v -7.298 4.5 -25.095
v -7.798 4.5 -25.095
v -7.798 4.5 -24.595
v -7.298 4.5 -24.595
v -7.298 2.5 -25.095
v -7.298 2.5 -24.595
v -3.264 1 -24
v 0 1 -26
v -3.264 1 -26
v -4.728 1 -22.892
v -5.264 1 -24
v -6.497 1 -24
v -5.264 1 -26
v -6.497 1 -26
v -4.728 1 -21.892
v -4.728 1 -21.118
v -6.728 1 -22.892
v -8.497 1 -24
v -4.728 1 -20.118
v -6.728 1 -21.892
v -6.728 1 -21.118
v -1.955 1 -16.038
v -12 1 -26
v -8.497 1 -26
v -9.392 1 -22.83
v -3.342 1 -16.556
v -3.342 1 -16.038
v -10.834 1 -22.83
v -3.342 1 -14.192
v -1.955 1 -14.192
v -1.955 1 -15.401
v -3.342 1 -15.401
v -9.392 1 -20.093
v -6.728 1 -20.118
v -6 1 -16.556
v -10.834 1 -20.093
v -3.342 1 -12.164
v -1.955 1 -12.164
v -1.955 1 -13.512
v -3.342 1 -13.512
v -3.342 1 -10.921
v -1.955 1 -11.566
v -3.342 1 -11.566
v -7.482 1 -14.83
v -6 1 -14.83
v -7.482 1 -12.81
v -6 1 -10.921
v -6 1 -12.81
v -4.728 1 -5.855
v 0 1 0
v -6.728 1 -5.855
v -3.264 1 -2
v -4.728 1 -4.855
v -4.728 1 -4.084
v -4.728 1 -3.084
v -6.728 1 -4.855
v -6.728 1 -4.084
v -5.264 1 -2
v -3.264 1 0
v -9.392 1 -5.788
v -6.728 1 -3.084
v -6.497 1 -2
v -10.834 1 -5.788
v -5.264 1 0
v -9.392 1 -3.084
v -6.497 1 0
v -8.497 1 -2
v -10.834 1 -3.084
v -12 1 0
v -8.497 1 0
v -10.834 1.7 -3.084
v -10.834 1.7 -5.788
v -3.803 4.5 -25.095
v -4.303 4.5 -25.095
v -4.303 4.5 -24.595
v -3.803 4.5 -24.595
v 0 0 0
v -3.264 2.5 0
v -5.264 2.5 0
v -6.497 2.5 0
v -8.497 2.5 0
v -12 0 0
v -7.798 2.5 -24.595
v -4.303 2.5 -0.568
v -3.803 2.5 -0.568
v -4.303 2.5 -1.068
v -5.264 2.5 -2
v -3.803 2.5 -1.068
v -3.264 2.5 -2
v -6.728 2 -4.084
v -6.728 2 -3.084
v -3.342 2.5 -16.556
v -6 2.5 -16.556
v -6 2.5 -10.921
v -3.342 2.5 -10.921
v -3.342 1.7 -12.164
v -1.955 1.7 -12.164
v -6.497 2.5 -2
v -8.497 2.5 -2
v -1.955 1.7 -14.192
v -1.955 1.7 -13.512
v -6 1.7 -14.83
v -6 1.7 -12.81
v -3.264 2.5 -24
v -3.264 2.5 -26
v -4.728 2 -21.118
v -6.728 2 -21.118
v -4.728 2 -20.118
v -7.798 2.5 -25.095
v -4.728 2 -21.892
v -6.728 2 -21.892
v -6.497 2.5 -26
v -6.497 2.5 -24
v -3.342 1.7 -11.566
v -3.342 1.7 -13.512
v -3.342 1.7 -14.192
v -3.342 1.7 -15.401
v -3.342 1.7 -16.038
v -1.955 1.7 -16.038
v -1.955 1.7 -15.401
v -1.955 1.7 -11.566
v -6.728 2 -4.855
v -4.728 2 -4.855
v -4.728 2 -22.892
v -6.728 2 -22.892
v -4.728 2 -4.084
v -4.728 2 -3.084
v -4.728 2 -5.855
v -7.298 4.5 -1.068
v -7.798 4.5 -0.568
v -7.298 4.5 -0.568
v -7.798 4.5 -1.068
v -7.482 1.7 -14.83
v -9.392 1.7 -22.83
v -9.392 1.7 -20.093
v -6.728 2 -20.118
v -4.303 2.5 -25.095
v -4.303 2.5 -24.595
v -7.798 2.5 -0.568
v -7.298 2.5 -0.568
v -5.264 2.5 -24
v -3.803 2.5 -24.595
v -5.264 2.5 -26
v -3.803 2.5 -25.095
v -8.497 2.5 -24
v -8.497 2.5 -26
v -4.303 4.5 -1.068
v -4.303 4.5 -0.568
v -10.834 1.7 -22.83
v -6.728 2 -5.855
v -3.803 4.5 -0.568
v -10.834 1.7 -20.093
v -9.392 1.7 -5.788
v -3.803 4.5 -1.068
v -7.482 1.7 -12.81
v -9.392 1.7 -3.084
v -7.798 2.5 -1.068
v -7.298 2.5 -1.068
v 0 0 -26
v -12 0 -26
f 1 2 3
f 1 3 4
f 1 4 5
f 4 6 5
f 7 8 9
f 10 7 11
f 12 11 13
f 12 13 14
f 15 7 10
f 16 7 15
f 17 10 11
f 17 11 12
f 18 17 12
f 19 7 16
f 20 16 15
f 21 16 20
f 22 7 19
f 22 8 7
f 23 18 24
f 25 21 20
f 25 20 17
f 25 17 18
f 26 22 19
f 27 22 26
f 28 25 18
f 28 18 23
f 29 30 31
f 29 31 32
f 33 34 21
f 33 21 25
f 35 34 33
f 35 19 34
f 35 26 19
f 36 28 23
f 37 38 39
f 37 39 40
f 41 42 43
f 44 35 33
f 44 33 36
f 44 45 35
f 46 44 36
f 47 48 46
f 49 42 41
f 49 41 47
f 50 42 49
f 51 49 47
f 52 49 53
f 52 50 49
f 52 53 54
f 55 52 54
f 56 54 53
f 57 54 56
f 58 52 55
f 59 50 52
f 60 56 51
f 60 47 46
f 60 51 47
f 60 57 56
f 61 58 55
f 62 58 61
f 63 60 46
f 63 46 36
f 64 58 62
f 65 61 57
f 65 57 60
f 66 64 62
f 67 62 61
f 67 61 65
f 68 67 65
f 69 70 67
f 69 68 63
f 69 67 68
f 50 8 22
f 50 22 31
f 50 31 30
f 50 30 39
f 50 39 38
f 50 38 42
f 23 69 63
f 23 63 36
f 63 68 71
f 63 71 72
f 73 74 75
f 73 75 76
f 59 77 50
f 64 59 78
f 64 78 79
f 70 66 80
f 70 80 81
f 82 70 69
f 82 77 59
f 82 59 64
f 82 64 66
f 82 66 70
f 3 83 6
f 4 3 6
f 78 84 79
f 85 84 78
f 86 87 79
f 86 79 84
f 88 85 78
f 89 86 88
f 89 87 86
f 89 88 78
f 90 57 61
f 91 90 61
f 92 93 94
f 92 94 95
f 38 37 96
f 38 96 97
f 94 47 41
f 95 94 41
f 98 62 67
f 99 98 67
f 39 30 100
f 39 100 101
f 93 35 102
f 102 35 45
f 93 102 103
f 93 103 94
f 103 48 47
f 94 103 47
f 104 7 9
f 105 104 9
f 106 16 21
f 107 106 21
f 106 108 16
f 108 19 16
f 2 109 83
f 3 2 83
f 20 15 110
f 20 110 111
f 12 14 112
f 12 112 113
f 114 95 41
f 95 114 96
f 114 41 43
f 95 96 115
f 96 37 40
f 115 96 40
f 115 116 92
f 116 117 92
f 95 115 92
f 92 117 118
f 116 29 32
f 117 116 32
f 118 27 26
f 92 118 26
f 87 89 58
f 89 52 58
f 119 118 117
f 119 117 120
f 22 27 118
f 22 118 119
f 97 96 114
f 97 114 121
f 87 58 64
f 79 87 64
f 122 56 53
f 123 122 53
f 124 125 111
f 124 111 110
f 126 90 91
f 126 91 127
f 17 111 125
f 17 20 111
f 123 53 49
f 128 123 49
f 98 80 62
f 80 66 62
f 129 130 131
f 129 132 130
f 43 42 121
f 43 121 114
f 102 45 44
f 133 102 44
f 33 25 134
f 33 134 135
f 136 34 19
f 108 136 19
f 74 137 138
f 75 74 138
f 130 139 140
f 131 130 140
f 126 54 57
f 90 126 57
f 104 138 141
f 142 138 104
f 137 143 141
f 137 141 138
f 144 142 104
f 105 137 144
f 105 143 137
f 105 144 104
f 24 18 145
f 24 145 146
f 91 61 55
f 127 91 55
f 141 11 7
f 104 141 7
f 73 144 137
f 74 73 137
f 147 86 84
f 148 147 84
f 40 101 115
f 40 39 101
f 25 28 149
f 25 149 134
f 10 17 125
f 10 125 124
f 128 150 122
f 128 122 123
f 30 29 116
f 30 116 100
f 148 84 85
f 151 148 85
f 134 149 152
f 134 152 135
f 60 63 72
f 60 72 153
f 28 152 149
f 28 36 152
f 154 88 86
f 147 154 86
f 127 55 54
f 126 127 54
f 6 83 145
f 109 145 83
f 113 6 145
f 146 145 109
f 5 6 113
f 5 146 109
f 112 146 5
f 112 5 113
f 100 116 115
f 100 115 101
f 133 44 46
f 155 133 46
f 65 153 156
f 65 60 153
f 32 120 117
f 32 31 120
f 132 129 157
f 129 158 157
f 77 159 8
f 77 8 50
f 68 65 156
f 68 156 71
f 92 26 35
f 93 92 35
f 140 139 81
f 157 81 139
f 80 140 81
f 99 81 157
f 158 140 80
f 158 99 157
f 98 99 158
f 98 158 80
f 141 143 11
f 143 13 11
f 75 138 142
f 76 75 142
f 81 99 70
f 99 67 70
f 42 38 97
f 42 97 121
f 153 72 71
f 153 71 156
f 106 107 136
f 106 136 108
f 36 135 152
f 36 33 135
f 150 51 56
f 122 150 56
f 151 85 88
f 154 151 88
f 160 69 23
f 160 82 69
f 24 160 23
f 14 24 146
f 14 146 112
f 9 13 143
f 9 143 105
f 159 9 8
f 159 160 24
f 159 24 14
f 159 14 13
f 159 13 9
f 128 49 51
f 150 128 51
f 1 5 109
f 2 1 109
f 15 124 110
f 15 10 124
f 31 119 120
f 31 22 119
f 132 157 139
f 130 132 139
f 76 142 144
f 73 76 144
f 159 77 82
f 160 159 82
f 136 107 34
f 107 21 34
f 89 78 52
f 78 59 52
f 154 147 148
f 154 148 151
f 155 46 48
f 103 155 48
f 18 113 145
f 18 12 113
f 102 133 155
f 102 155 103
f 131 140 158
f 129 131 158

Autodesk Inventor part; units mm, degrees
ref_plane "YZ Plane" through (0, 0, 0) normal (1, 0, 0) x (0, 1, 0)
ref_plane "XZ Plane" through (0, 0, 0) normal (0, 1, 0) x (-1, 0, 0)
ref_plane "XY Plane" through (0, 0, 0) normal (0, 0, 1) x (1, 0, 0)
sketch "Sketch1" plane through (0, 0, 0) normal (0, 1, 0) x (-1, 0, 0)
  line L0 (0, 0) -> (12, 0)
  line L1 (12, 0) -> (12, -26)
  line L2 (12, -26) -> (0, -26)
  line L3 (0, -26) -> (0, 0)
  dimension "d0" = 12
  dimension "d1" = 26
extrude "Extrusion1" add sketch "Sketch1" along normal blind 1
sketch "Sketch2" plane through (0, 1, 0) normal (0, 1, 0) x (1, 0, 0)
  line L0 (-8.4967, 0) -> (-6.4967, 0)
  line L1 (-6.4967, 0) -> (-6.4967, 2)
  line L2 (-6.4967, 2) -> (-8.4967, 2)
  line L3 (-8.4967, 2) -> (-8.4967, 0)
  line L4 (-5.264, 0) -> (-3.264, 0)
  line L5 (-3.264, 0) -> (-3.264, 2)
  line L6 (-3.264, 2) -> (-5.264, 2)
  line L7 (-5.264, 2) -> (-5.264, 0)
  line L8 (0, 26) -> (-12, 26) projected
  line L9 (-8.4967, 26) -> (-6.4967, 26)
  line L10 (-6.4967, 26) -> (-6.4967, 24)
  line L11 (-6.4967, 24) -> (-8.4967, 24)
  line L12 (-8.4967, 24) -> (-8.4967, 26)
  line L13 (-5.264, 24) -> (-3.264, 24)
  line L14 (-3.264, 24) -> (-3.264, 26)
  line L15 (-3.264, 26) -> (-5.264, 26)
  line L16 (-5.264, 26) -> (-5.264, 24)
  line L17 (-6, 10.9212) -> (-3.3419, 10.9212)
  line L18 (-3.3419, 10.9212) -> (-3.3419, 16.5565)
  line L19 (-3.3419, 16.5565) -> (-6, 16.5565)
  line L20 (-6, 16.5565) -> (-6, 10.9212)
  point P0 (0, 0)
  dimension "d4" = 2
  dimension "d5" = 2
  dimension "d6" = 2
  dimension "d7" = 2
  dimension "d8" = 2
extrude "Extrusion2" add sketch "Sketch2" along normal blind 1.5
sketch "Sketch3" plane through (0, 2.5, 0) normal (0, 1, 0) x (1, 0, 0)
  line L0 (-7.7977, 0.5679) -> (-7.2977, 0.5679)
  line L1 (-7.2977, 0.5679) -> (-7.2977, 1.0679)
  line L2 (-7.2977, 1.0679) -> (-7.7977, 1.0679)
  line L3 (-7.7977, 1.0679) -> (-7.7977, 0.5679)
  line L4 (-4.303, 0.5679) -> (-3.803, 0.5679)
  line L5 (-3.803, 0.5679) -> (-3.803, 1.0679)
  line L6 (-3.803, 1.0679) -> (-4.303, 1.0679)
  line L7 (-4.303, 1.0679) -> (-4.303, 0.5679)
  line L8 (-7.7977, 24.5946) -> (-7.2977, 24.5946)
  line L9 (-7.2977, 24.5946) -> (-7.2977, 25.0946)
  line L10 (-7.2977, 25.0946) -> (-7.7977, 25.0946)
  line L11 (-7.7977, 25.0946) -> (-7.7977, 24.5946)
  line L12 (-4.303, 24.5946) -> (-3.803, 24.5946)
  line L13 (-3.803, 24.5946) -> (-3.803, 25.0946)
  line L14 (-3.803, 25.0946) -> (-4.303, 25.0946)
  line L15 (-4.303, 25.0946) -> (-4.303, 24.5946)
  point P0 (0, 0)
  dimension "d11" = 0.5
  dimension "d12" = 0.5
  dimension "d13" = 0.5
  dimension "d14" = 0.5
  dimension "d15" = 0.5
  dimension "d16" = 0.5
extrude "Extrusion3" add sketch "Sketch3" along normal blind 2
sketch "Sketch4" plane through (0, 1, 0) normal (0, 1, 0) x (1, 0, 0)
  line L0 (-6.7275, 22.8918) -> (-4.7275, 22.8918)
  line L1 (-4.7275, 22.8918) -> (-4.7275, 21.8918)
  line L2 (-4.7275, 21.8918) -> (-6.7275, 21.8918)
  line L3 (-6.7275, 21.8918) -> (-6.7275, 22.8918)
  line L4 (-6.7275, 20.1179) -> (-4.7275, 20.1179)
  line L5 (-4.7275, 20.1179) -> (-4.7275, 21.1179)
  line L6 (-4.7275, 21.1179) -> (-6.7275, 21.1179)
  line L7 (-6.7275, 21.1179) -> (-6.7275, 20.1179)
  line L8 (-4.7275, 4.0841) -> (-6.7275, 4.0841)
  line L9 (-6.7275, 4.0841) -> (-6.7275, 3.0841)
  line L10 (-6.7275, 3.0841) -> (-4.7275, 3.0841)
  line L11 (-4.7275, 3.0841) -> (-4.7275, 4.0841)
  line L12 (-6.7275, 4.8554) -> (-4.7275, 4.8554)
  line L13 (-4.7275, 4.8554) -> (-4.7275, 5.8554)
  line L14 (-4.7275, 5.8554) -> (-6.7275, 5.8554)
  line L15 (-6.7275, 5.8554) -> (-6.7275, 4.8554)
  point P0 (0, 0)
  dimension "d19" = 2
  dimension "d20" = 1
  dimension "d21" = 2
  dimension "d22" = 1
  dimension "d23" = 2
  dimension "d24" = 1
  dimension "d25" = 2
  dimension "d26" = 1
extrude "Extrusion4" add sketch "Sketch4" along normal blind 1
sketch "Sketch5" plane through (0, 1, 0) normal (0, 1, 0) x (1, 0, 0)
  line L0 (-10.8338, 5.7882) -> (-9.3922, 5.7882)
  line L1 (-9.3922, 5.7882) -> (-9.3922, 3.0841)
  line L2 (-9.3922, 3.0841) -> (-10.8338, 3.0841)
  line L3 (-10.8338, 3.0841) -> (-10.8338, 5.7882)
  line L4 (-10.8338, 22.8302) -> (-9.3922, 22.8302)
  line L5 (-9.3922, 22.8302) -> (-9.3922, 20.0926)
  line L6 (-9.3922, 20.0926) -> (-10.8338, 20.0926)
  line L7 (-10.8338, 20.0926) -> (-10.8338, 22.8302)
  point P0 (0, 0)
extrude "Extrusion5" add sketch "Sketch5" along normal blind 0.7
sketch "Sketch6" plane through (0, 1, 0) normal (0, 1, 0) x (1, 0, 0)
  point P0 (0, 0)
sketch "Sketch7" plane through (0, 1, 0) normal (0, 1, 0) x (1, 0, 0)
  line L0 (-3.3419, 16.5565) -> (-3.3419, 10.9212) projected
  line L1 (-3.3419, 16.0376) -> (-1.9546, 16.0376)
  line L2 (-1.9546, 16.0376) -> (-1.9546, 15.4008)
  line L3 (-1.9546, 15.4008) -> (-3.3419, 15.4008)
  line L4 (-3.3419, 15.4008) -> (-3.3419, 16.0376)
  line L5 (-3.3419, 14.1925) -> (-1.9546, 14.1925)
  line L6 (-1.9546, 14.1925) -> (-1.9546, 13.5115)
  line L7 (-1.9546, 13.5115) -> (-3.3419, 13.5115)
  line L8 (-3.3419, 13.5115) -> (-3.3419, 14.1925)
  line L9 (-3.3419, 12.1636) -> (-1.9546, 12.1636)
  line L10 (-1.9546, 12.1636) -> (-1.9546, 11.5661)
  line L11 (-1.9546, 11.5661) -> (-3.3419, 11.5661)
  line L12 (-3.3419, 11.5661) -> (-3.3419, 12.1636)
  line L13 (-6, 10.9212) -> (-6, 16.5565) projected
  line L14 (-6, 14.8304) -> (-7.4823, 14.8304)
  line L15 (-7.4823, 14.8304) -> (-7.4823, 12.8104)
  line L16 (-7.4823, 12.8104) -> (-6, 12.8104)
  line L17 (-6, 12.8104) -> (-6, 14.8304)
  point P0 (0, 0)
extrude "Extrusion6" add sketch "Sketch7" along normal blind 0.7
properties part number "dc to dc"
